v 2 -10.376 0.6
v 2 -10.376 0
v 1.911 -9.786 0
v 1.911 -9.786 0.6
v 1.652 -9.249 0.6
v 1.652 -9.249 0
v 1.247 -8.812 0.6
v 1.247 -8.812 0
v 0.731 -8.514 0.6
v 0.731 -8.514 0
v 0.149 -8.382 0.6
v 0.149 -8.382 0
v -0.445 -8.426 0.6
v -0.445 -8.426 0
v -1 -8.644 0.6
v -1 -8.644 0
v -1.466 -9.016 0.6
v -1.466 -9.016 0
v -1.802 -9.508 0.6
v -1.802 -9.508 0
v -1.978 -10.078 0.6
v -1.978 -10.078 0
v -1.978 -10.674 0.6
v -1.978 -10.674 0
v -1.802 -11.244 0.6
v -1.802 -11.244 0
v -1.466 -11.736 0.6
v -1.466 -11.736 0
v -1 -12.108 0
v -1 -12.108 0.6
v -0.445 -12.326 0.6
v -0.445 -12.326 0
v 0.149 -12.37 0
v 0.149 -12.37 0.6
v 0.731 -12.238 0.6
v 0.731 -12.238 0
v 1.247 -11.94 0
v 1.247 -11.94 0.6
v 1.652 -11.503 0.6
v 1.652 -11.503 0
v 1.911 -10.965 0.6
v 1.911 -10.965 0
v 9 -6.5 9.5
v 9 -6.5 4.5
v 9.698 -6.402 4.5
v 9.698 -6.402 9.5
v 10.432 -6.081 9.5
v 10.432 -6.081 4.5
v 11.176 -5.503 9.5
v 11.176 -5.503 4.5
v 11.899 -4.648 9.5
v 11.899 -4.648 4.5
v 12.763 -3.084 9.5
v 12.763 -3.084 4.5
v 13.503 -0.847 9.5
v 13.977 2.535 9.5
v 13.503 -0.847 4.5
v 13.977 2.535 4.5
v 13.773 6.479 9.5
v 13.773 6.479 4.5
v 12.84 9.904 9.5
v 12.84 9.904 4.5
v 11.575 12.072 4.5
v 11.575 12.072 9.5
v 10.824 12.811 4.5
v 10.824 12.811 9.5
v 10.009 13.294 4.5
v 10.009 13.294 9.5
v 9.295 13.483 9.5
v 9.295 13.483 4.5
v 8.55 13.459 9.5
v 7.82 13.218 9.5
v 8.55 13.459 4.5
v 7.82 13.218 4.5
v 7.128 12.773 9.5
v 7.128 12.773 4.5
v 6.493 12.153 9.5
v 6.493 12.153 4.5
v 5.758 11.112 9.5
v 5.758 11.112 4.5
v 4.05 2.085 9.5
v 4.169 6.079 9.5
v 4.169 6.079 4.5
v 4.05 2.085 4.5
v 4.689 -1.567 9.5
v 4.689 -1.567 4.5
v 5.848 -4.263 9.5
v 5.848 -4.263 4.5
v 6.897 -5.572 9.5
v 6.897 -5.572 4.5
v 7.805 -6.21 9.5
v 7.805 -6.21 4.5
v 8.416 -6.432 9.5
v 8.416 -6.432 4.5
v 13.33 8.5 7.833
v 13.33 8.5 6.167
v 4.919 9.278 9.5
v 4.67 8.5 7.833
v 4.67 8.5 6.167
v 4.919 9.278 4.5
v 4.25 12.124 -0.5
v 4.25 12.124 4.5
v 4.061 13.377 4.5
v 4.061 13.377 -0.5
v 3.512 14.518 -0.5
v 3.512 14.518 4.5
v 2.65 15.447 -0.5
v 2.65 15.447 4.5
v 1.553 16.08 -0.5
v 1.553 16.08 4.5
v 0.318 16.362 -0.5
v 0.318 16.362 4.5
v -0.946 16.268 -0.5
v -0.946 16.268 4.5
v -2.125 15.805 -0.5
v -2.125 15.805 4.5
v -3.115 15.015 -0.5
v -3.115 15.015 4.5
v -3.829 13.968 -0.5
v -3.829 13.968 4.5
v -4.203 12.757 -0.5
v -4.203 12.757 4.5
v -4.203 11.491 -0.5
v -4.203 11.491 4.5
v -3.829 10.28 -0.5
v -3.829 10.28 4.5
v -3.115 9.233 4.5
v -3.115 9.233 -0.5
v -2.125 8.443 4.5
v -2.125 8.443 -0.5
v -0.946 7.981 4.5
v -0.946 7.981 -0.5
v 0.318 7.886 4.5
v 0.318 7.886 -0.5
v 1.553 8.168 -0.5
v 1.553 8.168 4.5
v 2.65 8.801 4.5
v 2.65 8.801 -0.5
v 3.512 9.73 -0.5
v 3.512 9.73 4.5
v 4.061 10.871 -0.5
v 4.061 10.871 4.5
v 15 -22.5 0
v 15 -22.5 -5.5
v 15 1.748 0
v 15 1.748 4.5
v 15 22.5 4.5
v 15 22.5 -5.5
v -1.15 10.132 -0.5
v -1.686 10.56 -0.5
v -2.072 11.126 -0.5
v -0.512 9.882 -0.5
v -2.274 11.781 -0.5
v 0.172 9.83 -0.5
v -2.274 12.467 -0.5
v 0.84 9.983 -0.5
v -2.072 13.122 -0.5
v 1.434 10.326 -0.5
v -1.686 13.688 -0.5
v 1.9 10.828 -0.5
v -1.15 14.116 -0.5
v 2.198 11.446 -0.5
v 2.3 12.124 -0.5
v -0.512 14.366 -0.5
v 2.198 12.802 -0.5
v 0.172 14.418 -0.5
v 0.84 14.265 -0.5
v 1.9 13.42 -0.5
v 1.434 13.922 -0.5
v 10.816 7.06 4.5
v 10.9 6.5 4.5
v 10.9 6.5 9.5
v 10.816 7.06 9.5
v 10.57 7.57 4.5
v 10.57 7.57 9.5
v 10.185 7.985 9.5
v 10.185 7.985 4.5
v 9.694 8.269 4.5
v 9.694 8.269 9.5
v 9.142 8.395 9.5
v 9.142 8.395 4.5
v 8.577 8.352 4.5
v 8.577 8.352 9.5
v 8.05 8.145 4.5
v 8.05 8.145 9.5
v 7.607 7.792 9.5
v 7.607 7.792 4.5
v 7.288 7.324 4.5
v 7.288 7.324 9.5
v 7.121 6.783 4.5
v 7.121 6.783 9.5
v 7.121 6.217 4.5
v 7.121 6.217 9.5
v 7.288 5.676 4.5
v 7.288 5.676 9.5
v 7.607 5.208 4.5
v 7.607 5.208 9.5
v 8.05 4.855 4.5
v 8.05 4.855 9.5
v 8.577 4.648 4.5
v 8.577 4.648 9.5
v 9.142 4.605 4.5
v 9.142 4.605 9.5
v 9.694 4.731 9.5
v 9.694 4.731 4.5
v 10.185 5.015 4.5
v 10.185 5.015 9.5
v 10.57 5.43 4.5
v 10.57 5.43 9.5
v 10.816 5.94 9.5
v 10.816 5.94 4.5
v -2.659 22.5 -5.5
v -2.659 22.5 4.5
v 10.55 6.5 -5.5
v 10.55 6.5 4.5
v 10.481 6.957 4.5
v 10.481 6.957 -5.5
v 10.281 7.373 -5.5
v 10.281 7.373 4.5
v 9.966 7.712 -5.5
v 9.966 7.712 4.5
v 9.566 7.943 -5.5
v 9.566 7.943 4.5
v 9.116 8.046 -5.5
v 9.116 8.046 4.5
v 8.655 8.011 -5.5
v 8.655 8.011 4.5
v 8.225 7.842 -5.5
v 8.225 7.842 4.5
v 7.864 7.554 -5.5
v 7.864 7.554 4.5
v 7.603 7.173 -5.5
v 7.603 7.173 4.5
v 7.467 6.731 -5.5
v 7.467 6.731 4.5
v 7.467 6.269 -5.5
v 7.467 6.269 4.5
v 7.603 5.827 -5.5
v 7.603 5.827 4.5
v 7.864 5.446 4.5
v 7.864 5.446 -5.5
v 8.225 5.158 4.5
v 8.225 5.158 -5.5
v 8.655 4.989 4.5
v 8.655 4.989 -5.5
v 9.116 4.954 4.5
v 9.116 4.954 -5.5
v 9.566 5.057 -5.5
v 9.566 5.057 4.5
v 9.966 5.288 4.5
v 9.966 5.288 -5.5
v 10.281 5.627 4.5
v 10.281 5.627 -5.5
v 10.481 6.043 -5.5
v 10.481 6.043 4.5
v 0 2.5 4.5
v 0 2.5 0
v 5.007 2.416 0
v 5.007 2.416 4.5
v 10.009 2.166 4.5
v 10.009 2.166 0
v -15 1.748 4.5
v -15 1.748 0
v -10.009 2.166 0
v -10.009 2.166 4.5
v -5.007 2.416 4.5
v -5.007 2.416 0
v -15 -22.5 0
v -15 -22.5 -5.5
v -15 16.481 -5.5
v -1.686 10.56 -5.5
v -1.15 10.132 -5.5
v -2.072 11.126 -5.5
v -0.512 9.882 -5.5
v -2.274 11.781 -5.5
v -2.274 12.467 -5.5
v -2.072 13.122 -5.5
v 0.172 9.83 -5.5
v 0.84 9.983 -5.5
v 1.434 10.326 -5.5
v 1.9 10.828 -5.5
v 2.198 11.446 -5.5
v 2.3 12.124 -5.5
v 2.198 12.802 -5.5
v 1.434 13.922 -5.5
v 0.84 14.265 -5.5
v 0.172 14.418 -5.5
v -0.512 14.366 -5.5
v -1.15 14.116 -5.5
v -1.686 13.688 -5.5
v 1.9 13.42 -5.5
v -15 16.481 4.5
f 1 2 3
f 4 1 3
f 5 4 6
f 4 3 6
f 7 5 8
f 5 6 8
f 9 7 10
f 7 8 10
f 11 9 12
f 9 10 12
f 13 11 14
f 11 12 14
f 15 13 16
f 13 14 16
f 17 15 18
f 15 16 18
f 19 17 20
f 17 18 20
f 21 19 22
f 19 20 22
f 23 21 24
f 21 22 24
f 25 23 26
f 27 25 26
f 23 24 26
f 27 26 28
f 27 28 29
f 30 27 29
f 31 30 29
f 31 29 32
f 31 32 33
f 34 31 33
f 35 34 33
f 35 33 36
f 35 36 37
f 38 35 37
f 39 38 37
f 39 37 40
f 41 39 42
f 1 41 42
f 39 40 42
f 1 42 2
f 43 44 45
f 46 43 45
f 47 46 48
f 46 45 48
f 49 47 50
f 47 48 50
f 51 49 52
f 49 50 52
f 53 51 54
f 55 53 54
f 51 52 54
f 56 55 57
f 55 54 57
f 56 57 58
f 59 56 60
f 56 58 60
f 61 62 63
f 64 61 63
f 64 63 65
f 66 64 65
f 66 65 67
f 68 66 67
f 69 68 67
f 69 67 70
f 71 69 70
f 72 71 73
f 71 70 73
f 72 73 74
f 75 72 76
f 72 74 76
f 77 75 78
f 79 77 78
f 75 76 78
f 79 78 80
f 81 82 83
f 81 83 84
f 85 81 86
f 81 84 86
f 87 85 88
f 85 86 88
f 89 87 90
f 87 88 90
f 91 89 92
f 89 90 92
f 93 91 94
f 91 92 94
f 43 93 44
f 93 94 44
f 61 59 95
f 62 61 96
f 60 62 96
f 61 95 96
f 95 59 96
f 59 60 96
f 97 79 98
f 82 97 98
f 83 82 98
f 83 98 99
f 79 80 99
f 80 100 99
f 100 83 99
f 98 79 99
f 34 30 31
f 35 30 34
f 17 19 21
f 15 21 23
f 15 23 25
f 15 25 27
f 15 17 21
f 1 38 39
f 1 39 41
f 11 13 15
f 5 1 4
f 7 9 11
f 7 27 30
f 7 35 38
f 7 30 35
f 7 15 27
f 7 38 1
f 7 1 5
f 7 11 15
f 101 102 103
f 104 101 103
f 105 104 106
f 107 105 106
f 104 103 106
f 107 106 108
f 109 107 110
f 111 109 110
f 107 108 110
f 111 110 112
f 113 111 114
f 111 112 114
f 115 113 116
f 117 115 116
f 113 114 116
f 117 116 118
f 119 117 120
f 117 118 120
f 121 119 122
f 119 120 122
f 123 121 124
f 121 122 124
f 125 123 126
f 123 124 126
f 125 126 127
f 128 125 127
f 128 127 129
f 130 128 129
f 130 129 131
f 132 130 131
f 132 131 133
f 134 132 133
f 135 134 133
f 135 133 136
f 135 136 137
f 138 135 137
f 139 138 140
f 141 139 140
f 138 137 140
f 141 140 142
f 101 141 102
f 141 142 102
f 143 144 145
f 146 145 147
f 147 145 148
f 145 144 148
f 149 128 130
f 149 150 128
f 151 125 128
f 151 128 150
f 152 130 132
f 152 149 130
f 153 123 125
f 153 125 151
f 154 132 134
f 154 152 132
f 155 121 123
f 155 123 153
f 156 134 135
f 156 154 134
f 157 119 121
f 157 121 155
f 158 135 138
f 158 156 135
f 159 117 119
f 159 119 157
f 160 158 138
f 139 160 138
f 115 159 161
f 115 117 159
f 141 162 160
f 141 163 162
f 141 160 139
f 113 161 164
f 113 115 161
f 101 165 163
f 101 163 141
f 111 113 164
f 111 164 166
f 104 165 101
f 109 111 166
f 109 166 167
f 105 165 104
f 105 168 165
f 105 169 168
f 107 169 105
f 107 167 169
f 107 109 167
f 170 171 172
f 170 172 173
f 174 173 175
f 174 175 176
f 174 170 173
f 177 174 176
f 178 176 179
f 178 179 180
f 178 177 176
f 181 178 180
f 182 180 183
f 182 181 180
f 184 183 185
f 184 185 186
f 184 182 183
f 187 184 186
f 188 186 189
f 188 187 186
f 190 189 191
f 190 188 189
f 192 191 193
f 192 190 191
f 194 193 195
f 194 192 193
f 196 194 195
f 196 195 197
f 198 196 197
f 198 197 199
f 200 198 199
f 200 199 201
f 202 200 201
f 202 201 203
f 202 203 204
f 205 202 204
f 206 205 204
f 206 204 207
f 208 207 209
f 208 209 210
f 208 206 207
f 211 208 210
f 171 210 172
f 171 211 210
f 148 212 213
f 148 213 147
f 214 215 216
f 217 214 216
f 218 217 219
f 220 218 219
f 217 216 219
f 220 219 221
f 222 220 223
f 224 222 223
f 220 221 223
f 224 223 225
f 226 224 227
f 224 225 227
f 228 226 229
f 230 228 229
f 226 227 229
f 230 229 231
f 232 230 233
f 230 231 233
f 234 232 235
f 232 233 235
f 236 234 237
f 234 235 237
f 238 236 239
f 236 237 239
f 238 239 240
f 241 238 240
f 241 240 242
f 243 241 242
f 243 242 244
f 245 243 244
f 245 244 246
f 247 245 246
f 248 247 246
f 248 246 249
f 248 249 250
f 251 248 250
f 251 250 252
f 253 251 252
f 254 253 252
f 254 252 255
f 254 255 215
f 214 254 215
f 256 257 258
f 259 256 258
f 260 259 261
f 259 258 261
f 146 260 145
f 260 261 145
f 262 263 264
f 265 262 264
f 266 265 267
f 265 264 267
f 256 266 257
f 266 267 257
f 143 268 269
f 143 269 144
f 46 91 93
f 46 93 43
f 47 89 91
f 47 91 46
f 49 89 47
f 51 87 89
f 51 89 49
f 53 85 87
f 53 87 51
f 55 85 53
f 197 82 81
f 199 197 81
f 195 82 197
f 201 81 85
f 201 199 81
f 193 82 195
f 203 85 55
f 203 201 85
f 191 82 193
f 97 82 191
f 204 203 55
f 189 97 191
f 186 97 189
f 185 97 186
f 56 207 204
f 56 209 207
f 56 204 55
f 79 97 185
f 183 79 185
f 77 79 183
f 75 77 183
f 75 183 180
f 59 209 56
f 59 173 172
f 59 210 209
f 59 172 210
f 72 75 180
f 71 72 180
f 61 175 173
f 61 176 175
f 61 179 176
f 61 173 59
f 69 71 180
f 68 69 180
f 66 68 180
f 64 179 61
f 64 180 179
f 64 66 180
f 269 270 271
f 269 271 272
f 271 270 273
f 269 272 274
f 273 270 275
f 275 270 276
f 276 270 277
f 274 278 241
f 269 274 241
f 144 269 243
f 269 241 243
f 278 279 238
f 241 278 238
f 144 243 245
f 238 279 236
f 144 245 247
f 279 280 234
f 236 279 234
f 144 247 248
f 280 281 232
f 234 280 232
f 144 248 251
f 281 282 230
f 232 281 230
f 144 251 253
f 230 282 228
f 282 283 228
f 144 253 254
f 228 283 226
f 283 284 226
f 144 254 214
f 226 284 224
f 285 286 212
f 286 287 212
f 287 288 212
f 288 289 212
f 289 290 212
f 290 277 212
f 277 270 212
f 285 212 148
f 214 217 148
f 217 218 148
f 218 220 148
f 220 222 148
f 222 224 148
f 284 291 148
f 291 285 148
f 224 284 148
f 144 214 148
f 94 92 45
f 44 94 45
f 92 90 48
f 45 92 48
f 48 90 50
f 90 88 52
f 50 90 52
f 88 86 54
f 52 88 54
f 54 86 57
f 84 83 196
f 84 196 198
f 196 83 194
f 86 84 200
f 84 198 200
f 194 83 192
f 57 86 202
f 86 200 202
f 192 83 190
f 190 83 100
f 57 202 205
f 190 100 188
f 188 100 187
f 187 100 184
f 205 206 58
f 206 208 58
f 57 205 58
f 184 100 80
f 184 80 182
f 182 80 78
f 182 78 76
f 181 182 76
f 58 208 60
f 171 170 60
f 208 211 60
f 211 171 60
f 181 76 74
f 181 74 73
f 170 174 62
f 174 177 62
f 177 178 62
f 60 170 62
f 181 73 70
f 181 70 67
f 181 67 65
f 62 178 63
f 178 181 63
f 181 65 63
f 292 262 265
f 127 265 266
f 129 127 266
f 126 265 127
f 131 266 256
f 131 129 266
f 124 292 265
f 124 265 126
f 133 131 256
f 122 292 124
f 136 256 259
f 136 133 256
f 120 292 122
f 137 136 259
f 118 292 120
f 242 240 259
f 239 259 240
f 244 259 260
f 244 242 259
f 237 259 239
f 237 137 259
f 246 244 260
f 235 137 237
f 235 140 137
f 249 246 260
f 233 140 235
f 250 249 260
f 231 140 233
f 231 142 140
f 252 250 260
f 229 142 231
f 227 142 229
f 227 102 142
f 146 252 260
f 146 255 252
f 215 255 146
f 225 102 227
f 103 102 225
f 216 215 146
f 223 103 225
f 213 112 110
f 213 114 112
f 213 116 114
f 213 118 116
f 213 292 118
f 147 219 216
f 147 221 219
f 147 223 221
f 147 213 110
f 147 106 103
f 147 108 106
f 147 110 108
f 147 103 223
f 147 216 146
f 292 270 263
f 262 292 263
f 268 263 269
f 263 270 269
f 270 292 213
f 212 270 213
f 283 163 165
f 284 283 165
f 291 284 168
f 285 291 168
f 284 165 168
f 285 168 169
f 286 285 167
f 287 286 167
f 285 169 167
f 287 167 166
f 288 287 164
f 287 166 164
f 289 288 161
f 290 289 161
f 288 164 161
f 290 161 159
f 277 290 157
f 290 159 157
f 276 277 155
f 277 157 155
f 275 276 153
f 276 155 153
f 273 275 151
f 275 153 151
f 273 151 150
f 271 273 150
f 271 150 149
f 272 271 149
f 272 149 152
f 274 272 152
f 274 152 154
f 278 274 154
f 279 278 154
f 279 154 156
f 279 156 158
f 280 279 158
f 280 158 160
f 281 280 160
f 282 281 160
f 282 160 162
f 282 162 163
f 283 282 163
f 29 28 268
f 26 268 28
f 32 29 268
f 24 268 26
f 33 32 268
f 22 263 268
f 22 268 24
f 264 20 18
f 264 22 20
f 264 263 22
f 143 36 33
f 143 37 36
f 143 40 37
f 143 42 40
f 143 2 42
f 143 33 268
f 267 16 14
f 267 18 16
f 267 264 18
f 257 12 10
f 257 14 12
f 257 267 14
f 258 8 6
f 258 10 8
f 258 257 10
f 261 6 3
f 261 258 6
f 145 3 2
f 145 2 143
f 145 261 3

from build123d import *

# Parameters (mm, degrees)
F0_W          = 30
F0_H          = 25
F1_DEPTH      = 5.5
F0_H_2        = 20
F2_DEPTH      = 5.5
F2_DEPTH_BACK = 4.5
F4_DEPTH      = 4.5
F5_R          = 2
F6_DEPTH      = 0.6
F7_R          = 4.25
F8_DEPTH      = 5
F9_R          = 2.3
F10_DEPTH     = 25
F11_R         = 1.55
F12_DEPTH     = 25
F14_DEPTH     = 25
F15_R         = 1.9
F16_DEPTH     = 5


with BuildPart() as f1:
    # F0 (on Top) → F1 (new body)
    with BuildSketch(Plane.XY):
        with Locations((0, -10)):
            Rectangle(F0_W, F0_H)
    extrude(amount=-F1_DEPTH)

    # F0 (on Top) → F2 (join, two sides)
    with BuildSketch(Plane.XY) as f2_sk:
        with Locations((0, 12.5)):
            Rectangle(F0_W, F0_H_2)
    extrude(amount=-F2_DEPTH)
    extrude(f2_sk.sketch, amount=F2_DEPTH_BACK)

    # F3 (on face) → F4 (join, through all)
    with BuildSketch(Plane.XY):
        with BuildLine():
            ThreePointArc((0, 2.5), (7.509416259, 2.3119109665), (15, 1.748115566))
            Line((15, 1.748115566), (15, 2.5))
            Line((15, 2.5), (0, 2.5))
        make_face()
        with BuildLine():
            Line((-15, 2.5), (-15, 1.748115566))
            ThreePointArc((-15, 1.748115566), (-7.509416259, 2.3119109665), (0, 2.5))
            Line((0, 2.5), (-15, 2.5))
        make_face()
    extrude(amount=F4_DEPTH)

    # F5 (on face) → F6 (join)
    with BuildSketch(Plane.XY):
        with Locations((0, -10.375942217)):
            Circle(F5_R)
    extrude(amount=F6_DEPTH)

    # F7 (on face) → F8 (cut)
    with BuildSketch(Plane.XY.offset(4.5)):
        with Locations((0, 12.124057783)):
            Circle(F7_R)
    extrude(amount=-F8_DEPTH, mode=Mode.SUBTRACT)

    # F9 (on face) → F10 (cut)
    with BuildSketch(Plane.XY.offset(-0.5)):
        with Locations((0, 12.124057783)):
            Circle(F9_R)
    extrude(amount=-F10_DEPTH, mode=Mode.SUBTRACT)

    # F11 (on face) → F12 (cut)
    with BuildSketch(Plane.XY.offset(4.5)):
        with Locations((9, 6.5)):
            Circle(F11_R)
    extrude(amount=-F12_DEPTH, mode=Mode.SUBTRACT)

    # F13 (on face) → F14 (cut)
    with BuildSketch(Plane.XY.offset(4.5)):
        Polygon((-15, 16.480823502), (-2.6588593031, 22.5), (-15, 22.5), align=None)
    extrude(amount=-F14_DEPTH, mode=Mode.SUBTRACT)


with BuildPart() as f16:
    # F15 (on face) → F16 (new body)
    with BuildSketch(Plane.XY.offset(4.5)):
        with BuildLine():
            add(Edge.make_bspline(
                [(9, -6.5), (17.6602540378, -6.5), (13.3301270189, 8.5), (9, 23.5), (4.6698729811, 8.5), (0.3397459622, -6.5), (9, -6.5)],
                knots=[0, 0, 0, 2.0943951024, 2.0943951024, 4.1887902048, 4.1887902048, 6.2831853072, 6.2831853072, 6.2831853072], degree=2, weights=[1, 0.5, 1, 0.5, 1, 0.5, 1]))
        make_face()
        with Locations((9, 6.5)):
            Circle(F15_R, mode=Mode.SUBTRACT)
    extrude(amount=F16_DEPTH)


solid = Compound([f1.part, f16.part])
